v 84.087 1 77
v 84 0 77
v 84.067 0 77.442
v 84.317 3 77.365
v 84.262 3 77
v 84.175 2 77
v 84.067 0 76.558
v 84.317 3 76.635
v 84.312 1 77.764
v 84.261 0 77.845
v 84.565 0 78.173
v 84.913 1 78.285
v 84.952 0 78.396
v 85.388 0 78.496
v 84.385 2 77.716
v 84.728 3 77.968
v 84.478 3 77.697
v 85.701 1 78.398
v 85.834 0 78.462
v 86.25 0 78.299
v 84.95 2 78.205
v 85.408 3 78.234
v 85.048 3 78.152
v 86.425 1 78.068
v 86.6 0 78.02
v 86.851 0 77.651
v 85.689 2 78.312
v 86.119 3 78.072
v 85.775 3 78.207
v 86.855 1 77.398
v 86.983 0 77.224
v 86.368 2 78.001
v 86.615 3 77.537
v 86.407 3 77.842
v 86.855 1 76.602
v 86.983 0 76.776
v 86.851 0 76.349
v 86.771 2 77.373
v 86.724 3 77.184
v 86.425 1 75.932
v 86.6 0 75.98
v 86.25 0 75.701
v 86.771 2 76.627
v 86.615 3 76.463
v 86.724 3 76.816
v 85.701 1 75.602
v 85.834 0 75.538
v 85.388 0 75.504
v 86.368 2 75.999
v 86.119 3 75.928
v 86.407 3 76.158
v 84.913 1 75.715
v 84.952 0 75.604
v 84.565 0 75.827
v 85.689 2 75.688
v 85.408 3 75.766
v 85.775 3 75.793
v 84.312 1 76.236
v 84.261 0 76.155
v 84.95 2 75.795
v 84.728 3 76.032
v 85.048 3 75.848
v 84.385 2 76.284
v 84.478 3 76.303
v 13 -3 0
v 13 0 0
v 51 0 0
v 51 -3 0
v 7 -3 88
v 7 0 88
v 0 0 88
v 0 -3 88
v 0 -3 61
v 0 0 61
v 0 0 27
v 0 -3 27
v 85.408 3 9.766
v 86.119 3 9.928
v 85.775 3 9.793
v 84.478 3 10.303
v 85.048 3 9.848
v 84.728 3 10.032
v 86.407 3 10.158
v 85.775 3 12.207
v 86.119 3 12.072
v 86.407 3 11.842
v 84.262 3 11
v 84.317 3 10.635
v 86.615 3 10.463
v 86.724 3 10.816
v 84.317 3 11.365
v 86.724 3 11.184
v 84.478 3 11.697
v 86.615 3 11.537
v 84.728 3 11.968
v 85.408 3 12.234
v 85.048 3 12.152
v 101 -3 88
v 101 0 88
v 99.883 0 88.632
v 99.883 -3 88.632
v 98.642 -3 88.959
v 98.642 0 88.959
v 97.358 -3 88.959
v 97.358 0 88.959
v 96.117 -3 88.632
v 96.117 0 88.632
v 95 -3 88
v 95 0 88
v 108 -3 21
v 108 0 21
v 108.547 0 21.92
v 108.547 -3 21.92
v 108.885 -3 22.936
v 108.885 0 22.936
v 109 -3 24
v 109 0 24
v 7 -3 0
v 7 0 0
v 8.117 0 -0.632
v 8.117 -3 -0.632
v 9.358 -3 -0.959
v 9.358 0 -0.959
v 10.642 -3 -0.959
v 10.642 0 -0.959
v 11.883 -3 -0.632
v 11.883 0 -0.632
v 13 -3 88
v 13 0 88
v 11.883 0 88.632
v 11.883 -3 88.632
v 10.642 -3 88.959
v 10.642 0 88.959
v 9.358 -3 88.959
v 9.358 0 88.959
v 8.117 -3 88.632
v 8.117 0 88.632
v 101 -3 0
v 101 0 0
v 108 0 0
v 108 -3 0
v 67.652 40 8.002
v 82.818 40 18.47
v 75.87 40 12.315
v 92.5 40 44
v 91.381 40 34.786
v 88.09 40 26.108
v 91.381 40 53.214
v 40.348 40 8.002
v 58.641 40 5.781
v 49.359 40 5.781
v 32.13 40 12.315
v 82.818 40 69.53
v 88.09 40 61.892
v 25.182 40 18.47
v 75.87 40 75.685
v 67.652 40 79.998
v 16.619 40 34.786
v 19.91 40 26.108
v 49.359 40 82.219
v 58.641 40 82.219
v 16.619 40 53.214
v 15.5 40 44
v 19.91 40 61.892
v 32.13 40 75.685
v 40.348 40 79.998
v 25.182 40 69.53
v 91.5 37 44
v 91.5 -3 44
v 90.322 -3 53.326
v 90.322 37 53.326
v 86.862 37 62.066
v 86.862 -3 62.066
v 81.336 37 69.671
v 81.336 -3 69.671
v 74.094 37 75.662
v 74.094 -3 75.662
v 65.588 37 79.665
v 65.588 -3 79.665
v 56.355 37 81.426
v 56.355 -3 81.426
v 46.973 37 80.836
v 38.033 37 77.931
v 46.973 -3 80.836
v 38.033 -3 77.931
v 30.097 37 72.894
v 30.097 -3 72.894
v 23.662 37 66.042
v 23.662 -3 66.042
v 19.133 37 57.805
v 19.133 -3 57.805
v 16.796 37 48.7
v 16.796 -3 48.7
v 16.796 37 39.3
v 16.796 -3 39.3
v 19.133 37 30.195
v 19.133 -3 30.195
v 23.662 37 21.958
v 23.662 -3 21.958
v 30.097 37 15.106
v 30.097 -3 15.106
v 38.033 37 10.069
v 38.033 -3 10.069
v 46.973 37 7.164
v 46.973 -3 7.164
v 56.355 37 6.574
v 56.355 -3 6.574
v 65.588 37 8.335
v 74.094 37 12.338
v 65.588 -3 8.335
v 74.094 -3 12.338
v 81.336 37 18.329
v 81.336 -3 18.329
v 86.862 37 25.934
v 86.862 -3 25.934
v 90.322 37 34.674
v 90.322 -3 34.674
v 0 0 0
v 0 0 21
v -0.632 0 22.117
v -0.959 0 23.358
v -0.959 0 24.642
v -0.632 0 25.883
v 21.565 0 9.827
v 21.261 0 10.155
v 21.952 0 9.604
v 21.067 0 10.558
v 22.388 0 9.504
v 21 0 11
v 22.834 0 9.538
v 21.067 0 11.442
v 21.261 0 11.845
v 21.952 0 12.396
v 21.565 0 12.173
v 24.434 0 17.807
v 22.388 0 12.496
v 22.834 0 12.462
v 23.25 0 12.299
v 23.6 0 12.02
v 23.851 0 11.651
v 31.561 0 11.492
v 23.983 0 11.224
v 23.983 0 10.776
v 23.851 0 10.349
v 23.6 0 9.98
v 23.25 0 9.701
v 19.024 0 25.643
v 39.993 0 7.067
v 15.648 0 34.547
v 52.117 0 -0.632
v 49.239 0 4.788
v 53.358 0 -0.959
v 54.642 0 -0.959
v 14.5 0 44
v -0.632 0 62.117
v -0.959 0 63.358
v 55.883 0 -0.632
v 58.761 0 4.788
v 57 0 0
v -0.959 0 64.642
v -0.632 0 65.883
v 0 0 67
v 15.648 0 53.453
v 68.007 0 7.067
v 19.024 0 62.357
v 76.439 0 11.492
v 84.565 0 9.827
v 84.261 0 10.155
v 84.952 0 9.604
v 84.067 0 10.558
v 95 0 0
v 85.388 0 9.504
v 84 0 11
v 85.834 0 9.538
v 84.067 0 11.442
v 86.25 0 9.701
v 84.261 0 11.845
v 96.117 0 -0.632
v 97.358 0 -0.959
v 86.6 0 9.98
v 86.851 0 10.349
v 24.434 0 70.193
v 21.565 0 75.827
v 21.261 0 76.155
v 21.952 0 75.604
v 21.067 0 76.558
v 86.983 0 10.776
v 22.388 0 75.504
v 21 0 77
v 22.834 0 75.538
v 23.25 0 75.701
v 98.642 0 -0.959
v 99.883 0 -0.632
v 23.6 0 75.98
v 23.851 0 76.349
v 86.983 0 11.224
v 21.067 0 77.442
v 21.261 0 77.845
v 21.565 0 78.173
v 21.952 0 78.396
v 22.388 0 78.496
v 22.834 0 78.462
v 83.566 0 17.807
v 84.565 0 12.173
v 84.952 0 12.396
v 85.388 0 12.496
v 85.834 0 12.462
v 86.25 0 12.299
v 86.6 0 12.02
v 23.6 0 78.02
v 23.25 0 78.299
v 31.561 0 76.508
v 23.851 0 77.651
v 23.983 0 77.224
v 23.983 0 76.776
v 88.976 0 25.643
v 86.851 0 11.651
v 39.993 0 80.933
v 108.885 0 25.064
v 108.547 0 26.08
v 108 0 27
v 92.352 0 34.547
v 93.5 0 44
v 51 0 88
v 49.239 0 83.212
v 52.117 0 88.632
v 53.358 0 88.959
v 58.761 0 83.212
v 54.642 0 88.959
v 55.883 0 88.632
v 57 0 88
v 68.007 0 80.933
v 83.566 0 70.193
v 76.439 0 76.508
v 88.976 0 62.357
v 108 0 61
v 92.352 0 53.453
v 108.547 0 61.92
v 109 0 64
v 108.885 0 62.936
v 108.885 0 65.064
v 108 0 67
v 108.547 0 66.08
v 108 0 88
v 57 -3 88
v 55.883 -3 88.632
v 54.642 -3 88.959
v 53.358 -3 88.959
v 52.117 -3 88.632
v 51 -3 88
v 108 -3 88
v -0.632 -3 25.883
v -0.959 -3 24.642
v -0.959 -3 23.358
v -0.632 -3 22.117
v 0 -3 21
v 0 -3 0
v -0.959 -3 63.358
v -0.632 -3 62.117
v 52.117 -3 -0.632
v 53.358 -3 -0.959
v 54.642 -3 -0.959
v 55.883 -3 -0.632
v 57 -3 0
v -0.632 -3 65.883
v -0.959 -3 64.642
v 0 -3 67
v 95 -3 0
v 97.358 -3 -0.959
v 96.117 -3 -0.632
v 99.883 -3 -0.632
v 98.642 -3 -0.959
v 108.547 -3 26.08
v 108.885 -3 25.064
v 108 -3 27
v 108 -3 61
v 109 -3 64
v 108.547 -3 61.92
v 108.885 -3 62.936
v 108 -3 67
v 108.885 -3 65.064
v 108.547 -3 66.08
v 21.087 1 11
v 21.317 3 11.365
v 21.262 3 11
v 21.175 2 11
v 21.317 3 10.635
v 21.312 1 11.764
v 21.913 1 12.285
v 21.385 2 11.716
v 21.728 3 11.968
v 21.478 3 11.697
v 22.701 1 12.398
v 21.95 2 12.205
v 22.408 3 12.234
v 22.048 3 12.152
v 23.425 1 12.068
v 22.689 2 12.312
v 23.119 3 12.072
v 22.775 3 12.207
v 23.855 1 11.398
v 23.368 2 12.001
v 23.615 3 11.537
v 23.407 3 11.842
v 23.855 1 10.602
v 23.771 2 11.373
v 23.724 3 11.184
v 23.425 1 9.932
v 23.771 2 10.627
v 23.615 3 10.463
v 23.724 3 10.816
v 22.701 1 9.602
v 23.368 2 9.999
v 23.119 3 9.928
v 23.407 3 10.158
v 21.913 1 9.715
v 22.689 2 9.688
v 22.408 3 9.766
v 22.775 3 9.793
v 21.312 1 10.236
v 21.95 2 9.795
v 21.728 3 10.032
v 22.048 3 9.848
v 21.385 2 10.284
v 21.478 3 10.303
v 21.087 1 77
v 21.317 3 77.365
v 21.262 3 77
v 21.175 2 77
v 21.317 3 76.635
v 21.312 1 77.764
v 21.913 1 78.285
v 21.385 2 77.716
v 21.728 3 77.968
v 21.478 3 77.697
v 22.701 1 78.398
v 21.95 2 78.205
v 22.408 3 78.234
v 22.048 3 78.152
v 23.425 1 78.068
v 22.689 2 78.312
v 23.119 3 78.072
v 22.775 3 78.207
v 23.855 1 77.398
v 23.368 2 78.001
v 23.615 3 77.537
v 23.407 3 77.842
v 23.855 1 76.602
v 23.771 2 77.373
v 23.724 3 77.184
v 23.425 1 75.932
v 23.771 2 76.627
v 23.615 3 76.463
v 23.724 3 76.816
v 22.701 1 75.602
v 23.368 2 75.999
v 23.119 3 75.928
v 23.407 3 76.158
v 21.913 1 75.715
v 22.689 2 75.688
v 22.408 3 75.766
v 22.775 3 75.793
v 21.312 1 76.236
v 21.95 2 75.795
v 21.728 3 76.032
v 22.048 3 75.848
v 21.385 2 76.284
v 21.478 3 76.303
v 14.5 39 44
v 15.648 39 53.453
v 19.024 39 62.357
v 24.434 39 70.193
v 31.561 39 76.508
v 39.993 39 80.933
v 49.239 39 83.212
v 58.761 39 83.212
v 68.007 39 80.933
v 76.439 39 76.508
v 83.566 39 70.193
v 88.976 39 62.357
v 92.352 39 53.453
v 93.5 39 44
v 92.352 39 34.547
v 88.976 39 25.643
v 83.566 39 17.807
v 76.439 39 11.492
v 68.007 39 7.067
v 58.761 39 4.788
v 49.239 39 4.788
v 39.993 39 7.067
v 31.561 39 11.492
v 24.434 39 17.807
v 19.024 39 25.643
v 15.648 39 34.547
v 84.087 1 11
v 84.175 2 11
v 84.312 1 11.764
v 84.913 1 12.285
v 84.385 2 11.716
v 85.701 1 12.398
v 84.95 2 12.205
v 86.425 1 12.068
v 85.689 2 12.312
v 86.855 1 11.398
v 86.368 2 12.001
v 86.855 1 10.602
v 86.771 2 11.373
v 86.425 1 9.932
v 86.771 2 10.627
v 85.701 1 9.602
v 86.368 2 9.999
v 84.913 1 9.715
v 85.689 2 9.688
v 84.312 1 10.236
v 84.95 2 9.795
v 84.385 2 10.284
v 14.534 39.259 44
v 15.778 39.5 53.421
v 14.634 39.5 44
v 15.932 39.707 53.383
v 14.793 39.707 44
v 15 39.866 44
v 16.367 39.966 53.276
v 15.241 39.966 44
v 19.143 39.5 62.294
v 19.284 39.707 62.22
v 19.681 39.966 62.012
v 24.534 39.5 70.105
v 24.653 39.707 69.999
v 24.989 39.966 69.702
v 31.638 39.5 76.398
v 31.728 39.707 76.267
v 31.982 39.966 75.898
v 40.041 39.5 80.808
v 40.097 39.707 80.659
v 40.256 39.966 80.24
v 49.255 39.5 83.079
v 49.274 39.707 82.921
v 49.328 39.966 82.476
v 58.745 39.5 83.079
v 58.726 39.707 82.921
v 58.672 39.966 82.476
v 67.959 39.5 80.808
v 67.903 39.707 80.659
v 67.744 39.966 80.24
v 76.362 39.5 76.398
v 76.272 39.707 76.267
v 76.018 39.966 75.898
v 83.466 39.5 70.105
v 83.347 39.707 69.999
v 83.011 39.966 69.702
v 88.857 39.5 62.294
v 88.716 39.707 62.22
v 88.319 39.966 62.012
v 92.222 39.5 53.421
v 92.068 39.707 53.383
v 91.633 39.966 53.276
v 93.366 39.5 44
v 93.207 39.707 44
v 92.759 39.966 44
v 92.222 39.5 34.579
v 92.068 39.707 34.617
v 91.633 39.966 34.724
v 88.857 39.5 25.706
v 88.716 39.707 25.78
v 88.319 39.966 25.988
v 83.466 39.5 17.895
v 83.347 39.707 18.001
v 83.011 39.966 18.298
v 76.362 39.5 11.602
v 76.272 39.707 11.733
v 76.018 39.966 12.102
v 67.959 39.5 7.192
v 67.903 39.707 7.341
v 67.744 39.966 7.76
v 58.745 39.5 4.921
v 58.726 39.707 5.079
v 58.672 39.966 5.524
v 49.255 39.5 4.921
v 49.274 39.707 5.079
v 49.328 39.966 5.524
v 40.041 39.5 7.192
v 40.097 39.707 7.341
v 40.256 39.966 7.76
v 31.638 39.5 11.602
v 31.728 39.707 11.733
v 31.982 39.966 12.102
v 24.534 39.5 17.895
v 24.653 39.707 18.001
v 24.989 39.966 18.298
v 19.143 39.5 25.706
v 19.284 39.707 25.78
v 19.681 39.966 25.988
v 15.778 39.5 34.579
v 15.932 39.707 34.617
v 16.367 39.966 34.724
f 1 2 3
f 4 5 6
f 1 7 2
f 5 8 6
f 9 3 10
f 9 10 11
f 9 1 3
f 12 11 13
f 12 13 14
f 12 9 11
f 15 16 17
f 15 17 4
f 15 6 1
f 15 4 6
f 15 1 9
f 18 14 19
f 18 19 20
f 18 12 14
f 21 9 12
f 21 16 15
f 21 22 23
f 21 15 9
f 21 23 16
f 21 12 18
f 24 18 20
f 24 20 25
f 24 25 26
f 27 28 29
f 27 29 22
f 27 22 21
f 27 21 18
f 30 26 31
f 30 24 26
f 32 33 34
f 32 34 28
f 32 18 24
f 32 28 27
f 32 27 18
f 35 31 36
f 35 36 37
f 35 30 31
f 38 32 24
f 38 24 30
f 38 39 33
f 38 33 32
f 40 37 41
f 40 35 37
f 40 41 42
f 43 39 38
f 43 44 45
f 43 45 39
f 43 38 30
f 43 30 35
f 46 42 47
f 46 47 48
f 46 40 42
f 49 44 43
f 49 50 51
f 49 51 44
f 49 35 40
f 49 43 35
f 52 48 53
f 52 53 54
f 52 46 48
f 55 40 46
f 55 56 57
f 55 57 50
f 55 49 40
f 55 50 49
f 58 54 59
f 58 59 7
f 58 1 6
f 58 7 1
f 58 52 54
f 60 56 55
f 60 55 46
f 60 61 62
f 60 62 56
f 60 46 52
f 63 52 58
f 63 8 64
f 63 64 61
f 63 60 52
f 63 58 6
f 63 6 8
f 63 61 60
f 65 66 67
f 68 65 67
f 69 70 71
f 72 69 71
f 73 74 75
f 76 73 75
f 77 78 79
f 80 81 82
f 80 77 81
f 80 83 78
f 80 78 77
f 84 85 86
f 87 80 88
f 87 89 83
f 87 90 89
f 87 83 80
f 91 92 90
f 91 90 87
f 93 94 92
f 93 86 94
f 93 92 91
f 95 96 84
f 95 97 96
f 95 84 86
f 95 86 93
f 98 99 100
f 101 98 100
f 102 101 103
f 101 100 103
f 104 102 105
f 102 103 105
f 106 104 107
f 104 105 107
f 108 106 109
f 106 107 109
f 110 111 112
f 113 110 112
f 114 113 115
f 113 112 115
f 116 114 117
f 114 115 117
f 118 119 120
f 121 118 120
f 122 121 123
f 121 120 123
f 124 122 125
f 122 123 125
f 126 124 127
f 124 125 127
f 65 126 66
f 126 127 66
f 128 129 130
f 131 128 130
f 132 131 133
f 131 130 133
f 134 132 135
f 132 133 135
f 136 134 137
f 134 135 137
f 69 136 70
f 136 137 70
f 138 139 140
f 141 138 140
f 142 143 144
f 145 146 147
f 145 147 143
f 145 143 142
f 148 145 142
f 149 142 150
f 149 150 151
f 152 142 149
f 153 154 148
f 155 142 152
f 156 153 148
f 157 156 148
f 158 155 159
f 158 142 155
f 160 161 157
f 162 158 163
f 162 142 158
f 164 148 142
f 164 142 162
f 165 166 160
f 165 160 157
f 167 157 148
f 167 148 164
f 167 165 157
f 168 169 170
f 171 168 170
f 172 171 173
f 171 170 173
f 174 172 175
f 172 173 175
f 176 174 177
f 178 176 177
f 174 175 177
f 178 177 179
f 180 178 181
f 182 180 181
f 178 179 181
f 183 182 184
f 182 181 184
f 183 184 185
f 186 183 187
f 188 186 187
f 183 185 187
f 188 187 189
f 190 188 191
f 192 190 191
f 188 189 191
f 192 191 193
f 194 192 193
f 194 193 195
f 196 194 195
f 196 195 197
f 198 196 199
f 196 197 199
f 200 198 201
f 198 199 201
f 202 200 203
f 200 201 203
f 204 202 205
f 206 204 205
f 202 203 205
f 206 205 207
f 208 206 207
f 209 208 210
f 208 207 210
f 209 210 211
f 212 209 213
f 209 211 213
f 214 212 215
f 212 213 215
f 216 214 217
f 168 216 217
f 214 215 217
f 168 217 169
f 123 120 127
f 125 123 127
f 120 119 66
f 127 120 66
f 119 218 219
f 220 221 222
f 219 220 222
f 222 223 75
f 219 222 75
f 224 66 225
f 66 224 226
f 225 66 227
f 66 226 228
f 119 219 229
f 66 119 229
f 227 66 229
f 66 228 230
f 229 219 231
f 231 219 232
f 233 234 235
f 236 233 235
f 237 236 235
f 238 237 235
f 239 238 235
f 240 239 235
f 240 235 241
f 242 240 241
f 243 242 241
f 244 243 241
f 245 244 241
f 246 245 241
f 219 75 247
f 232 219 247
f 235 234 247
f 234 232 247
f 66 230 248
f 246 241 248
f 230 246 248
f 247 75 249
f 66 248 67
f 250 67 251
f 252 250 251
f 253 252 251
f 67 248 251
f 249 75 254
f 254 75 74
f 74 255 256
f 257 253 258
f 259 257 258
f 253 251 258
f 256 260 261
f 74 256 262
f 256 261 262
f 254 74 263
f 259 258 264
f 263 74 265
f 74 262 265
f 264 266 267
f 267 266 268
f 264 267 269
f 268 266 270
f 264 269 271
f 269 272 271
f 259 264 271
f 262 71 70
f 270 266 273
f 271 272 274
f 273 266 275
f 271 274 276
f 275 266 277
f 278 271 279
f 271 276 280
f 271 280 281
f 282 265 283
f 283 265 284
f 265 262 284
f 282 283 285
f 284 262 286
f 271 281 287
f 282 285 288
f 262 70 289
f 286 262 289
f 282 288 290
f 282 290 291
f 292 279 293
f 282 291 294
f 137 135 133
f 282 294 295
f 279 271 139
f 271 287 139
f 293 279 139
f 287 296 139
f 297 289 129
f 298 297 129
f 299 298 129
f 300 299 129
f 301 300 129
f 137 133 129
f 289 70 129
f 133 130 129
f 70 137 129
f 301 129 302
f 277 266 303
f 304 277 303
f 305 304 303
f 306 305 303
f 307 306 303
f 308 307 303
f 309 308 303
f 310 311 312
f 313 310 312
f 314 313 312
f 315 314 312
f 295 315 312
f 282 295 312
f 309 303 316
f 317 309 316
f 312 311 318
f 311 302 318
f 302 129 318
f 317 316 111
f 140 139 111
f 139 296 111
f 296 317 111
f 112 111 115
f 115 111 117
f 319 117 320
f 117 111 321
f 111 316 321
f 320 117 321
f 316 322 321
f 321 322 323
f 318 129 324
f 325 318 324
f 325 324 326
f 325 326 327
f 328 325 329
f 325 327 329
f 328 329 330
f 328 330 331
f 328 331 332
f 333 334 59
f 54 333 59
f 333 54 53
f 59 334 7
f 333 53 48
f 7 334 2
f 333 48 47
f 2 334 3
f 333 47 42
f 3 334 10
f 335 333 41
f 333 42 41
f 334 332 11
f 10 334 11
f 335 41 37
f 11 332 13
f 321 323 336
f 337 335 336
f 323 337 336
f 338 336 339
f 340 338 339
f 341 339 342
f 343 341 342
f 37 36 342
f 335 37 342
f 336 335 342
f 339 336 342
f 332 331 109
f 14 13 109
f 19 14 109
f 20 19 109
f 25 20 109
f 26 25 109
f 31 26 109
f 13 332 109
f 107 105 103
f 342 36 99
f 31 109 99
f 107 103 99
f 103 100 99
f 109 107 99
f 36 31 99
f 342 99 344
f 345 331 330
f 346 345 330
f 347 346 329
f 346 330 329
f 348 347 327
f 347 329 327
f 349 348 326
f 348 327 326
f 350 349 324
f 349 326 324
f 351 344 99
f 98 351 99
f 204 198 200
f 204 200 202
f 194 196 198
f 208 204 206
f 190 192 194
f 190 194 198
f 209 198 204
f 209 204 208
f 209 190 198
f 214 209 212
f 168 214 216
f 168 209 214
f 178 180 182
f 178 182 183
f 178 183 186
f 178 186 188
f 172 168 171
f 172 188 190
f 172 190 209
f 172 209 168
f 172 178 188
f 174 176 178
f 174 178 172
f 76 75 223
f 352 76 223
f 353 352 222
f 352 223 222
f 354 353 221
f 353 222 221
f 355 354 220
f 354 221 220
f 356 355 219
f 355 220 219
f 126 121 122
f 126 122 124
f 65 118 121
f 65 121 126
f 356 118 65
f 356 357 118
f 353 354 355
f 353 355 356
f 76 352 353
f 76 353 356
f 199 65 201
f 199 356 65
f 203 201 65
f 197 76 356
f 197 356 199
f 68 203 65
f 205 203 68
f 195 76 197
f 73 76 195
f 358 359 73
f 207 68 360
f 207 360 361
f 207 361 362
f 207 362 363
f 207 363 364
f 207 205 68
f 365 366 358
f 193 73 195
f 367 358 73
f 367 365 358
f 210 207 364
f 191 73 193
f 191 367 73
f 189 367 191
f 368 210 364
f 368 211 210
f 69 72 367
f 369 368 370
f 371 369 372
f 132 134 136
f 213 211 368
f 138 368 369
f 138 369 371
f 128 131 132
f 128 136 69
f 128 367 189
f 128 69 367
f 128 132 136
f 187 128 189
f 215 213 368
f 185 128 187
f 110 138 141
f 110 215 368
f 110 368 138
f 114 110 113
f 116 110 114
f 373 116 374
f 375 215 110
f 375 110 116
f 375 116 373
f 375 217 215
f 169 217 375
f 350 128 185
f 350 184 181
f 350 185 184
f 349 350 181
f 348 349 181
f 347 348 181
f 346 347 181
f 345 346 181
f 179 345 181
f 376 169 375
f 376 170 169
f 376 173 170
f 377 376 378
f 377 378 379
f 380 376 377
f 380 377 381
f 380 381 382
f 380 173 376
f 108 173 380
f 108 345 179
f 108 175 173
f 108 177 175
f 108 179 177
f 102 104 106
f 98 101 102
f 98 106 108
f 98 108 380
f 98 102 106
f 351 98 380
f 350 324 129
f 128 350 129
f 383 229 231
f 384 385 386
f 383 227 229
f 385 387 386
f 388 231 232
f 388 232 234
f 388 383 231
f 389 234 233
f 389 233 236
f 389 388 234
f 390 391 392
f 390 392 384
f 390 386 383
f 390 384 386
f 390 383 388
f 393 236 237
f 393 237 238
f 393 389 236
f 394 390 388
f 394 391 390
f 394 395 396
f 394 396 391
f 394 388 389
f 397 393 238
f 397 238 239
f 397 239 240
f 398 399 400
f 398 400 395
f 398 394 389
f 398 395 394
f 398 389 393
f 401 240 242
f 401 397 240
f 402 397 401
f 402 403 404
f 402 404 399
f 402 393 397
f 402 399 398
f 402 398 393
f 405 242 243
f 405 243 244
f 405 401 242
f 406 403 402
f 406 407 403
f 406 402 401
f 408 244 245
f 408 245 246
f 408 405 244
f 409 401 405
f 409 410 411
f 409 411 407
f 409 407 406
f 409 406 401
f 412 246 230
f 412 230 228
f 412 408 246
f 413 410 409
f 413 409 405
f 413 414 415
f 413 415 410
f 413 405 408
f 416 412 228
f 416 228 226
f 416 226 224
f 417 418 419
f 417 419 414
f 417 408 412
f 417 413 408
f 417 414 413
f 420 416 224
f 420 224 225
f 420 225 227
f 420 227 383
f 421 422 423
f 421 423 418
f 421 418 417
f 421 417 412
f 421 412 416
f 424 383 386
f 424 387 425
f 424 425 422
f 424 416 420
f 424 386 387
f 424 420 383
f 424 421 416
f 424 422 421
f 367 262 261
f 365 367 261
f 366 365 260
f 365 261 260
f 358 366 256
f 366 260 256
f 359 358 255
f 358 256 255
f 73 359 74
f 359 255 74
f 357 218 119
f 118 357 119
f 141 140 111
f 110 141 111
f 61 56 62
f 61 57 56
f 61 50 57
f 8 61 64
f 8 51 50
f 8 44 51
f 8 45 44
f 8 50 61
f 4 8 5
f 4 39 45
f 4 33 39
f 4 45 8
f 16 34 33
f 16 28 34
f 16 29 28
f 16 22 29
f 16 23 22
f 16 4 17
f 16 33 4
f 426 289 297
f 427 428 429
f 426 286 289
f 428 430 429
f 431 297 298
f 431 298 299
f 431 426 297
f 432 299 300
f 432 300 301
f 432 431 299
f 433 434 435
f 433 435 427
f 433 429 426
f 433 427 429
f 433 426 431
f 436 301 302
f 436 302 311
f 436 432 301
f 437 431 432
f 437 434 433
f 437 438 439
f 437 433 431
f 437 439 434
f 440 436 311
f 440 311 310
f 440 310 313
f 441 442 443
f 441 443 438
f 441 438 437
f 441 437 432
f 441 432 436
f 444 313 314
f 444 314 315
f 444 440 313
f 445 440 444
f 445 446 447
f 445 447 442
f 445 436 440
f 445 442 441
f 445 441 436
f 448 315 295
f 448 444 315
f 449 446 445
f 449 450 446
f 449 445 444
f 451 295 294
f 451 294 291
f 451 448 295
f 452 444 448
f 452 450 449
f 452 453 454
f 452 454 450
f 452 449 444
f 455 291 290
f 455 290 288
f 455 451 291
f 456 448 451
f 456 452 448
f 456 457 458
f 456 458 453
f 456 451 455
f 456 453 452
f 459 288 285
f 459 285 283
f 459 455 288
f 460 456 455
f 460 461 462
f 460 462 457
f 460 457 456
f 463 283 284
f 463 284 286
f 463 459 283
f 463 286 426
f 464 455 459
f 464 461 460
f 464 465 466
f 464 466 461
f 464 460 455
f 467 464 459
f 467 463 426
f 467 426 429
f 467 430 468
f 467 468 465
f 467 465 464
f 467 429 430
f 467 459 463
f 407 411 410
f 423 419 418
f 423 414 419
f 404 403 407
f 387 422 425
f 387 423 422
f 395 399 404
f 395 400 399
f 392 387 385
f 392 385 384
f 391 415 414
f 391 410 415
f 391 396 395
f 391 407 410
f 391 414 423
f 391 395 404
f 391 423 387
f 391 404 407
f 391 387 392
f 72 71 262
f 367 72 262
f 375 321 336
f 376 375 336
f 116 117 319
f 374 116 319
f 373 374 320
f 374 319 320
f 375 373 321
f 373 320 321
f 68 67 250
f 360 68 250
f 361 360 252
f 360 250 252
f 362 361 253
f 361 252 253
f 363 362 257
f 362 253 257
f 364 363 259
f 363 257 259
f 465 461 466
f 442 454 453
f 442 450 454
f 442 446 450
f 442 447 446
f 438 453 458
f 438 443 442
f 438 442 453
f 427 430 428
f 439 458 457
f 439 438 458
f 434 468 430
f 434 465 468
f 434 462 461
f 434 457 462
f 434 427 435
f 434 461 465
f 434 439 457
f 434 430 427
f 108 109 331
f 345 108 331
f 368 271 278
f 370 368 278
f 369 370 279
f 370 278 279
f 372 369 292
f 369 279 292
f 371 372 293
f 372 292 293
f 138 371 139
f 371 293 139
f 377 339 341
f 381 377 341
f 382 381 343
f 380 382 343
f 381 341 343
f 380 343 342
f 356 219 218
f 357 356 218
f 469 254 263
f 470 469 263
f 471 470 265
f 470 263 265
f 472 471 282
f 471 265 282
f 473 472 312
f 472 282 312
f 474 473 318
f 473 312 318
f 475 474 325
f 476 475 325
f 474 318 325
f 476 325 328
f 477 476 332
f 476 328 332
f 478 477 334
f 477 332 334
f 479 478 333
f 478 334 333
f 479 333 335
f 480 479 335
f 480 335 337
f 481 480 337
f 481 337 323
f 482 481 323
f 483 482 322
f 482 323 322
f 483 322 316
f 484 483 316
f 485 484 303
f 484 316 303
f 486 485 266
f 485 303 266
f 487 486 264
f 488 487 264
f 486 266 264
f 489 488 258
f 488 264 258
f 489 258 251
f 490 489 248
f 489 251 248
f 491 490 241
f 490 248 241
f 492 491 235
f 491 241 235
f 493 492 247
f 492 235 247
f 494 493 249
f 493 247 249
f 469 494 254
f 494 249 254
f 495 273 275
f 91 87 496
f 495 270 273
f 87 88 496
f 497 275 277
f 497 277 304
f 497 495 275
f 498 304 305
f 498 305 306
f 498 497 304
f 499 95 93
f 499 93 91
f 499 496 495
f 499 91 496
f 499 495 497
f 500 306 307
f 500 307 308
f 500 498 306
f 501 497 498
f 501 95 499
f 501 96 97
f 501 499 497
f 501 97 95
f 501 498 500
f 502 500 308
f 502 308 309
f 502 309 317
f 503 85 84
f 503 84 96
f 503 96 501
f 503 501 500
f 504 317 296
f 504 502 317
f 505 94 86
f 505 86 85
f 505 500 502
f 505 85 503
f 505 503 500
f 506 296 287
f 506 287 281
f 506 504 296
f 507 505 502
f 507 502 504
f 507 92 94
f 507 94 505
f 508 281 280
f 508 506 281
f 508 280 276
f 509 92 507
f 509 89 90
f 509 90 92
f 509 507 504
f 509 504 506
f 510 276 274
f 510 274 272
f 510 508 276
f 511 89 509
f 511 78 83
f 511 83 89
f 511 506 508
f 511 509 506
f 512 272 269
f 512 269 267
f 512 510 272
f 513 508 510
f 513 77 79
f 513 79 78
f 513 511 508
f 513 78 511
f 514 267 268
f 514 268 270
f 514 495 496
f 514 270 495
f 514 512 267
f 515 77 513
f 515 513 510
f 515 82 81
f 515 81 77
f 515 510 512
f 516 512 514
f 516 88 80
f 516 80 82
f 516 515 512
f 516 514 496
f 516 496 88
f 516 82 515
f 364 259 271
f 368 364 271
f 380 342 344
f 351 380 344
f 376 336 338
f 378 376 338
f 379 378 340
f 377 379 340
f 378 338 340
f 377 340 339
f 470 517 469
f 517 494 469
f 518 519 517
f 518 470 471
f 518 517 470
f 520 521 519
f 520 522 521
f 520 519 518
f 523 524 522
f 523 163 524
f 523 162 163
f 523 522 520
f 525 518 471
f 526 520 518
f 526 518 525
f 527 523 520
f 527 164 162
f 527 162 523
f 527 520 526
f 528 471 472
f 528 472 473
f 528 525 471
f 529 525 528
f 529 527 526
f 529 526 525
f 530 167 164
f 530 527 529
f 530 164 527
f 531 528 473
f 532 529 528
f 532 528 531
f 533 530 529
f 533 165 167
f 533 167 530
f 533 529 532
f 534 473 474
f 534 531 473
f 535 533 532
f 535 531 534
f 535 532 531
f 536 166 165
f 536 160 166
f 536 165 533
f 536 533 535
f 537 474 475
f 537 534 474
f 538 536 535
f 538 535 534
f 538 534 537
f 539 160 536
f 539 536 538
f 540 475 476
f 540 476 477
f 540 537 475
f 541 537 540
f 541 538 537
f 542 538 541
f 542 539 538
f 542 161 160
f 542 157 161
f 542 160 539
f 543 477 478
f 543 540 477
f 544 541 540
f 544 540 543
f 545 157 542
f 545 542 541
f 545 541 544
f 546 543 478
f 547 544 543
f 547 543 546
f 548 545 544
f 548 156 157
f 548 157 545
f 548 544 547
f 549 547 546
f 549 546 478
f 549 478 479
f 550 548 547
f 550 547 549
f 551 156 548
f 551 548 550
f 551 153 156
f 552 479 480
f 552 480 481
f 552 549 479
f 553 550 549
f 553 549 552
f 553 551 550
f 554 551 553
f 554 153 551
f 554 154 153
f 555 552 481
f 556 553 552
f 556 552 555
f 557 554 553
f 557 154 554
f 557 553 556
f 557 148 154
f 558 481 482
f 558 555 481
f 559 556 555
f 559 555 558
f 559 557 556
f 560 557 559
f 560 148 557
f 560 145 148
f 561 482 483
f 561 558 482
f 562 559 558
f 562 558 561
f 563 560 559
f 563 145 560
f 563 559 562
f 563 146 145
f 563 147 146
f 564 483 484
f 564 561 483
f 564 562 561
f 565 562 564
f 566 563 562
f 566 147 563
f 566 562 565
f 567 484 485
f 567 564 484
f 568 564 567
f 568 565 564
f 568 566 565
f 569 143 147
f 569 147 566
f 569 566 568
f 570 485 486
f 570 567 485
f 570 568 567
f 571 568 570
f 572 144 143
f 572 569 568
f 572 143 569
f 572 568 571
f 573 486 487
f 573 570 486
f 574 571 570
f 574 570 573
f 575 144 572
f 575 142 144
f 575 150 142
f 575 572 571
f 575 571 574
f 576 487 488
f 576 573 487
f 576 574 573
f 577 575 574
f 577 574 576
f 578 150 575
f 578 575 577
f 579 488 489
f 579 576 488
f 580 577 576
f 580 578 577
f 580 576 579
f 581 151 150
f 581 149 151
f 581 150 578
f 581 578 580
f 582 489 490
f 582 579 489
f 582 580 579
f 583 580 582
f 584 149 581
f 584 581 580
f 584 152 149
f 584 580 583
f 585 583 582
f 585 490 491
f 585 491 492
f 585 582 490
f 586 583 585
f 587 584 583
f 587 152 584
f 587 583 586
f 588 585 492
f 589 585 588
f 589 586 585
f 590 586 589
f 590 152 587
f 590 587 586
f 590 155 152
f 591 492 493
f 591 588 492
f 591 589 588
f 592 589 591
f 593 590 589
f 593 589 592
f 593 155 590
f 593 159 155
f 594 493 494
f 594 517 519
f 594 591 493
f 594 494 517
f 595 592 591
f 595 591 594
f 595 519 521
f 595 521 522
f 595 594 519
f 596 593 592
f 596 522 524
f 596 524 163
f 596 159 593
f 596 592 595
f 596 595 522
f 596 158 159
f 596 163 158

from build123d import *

# Parameters (mm, degrees)
F1_DEPTH = 3
F2_R     = 39.5
F3_DEPTH = 40
F4_R     = 1.5
F5_DEPTH = 3
F5_TAPER = 5
F6_R     = 1
F7_R     = 37.5
F8_DEPTH = 40


with BuildPart() as f1:
    # F0 (on Front) → F1 (new body)
    with BuildSketch(Plane.XZ):
        with BuildLine():
            Line((0, 21), (0, 0))
            Line((0, 0), (7, 0))
            ThreePointArc((7, 0), (7.7639320225, 8.472135955), (15, 4))
            ThreePointArc((15, 4), (14.472135955, 1.7639320225), (13, 0))
            Line((13, 0), (51, 0))
            ThreePointArc((51, 0), (49.2565835097, 5.5811388301), (54, 9))
            Line((54, 9), (54, 44))
            Line((54, 44), (0, 44))
            Line((0, 44), (0, 27))
            ThreePointArc((0, 27), (5.5811388301, 28.7434164903), (9, 24))
            ThreePointArc((9, 24), (5.5811388301, 19.2565835097), (0, 21))
        make_face()
        with BuildLine():
            ThreePointArc((15, 4), (7.7639320225, 8.472135955), (7, 0))
            Line((7, 0), (13, 0))
            ThreePointArc((13, 0), (14.472135955, 1.7639320225), (15, 4))
        make_face()
        with BuildLine():
            Line((13, 0), (7, 0))
            ThreePointArc((7, 0), (10, -1), (13, 0))
        make_face()
        with BuildLine():
            ThreePointArc((0, 27), (-1, 24), (0, 21))
            Line((0, 21), (0, 27))
        make_face()
        with BuildLine():
            Line((0, 27), (0, 21))
            ThreePointArc((0, 21), (5.5811388301, 19.2565835097), (9, 24))
            ThreePointArc((9, 24), (5.5811388301, 28.7434164903), (0, 27))
        make_face()
        with BuildLine():
            ThreePointArc((54, 9), (49.2565835097, 5.5811388301), (51, 0))
            Line((51, 0), (54, 0))
            Line((54, 0), (54, 9))
        make_face()
        with BuildLine():
            Line((54, 0), (51, 0))
            ThreePointArc((51, 0), (54, -1), (57, 0))
            Line((57, 0), (54, 0))
        make_face()
        with BuildLine():
            Line((0, 61), (0, 44))
            Line((0, 44), (54, 44))
            Line((54, 44), (54, 79))
            ThreePointArc((54, 79), (49.2565835097, 82.4188611699), (51, 88))
            Line((51, 88), (13, 88))
            ThreePointArc((13, 88), (14.472135955, 86.2360679775), (15, 84))
            ThreePointArc((15, 84), (7.7639320225, 79.527864045), (7, 88))
            Line((7, 88), (0, 88))
            Line((0, 88), (0, 67))
            ThreePointArc((0, 67), (5.5811388301, 68.7434164903), (9, 64))
            ThreePointArc((9, 64), (5.5811388301, 59.2565835097), (0, 61))
        make_face()
        with BuildLine():
            Line((54, 9), (54, 0))
            Line((54, 0), (57, 0))
            ThreePointArc((57, 0), (58.472135955, 1.7639320225), (59, 4))
            ThreePointArc((59, 4), (57.5355339059, 7.5355339059), (54, 9))
        make_face()
        with BuildLine():
            Line((54, 44), (54, 9))
            ThreePointArc((54, 9), (57.5355339059, 7.5355339059), (59, 4))
            ThreePointArc((59, 4), (58.472135955, 1.7639320225), (57, 0))
            Line((57, 0), (95, 0))
            ThreePointArc((95, 0), (95.7639320225, 8.472135955), (103, 4))
            ThreePointArc((103, 4), (102.472135955, 1.7639320225), (101, 0))
            Line((101, 0), (108, 0))
            Line((108, 0), (108, 21))
            ThreePointArc((108, 21), (99, 24), (108, 27))
            Line((108, 27), (108, 44))
            Line((108, 44), (54, 44))
        make_face()
        with BuildLine():
            ThreePointArc((0, 67), (-1, 64), (0, 61))
            Line((0, 61), (0, 67))
        make_face()
        with BuildLine():
            Line((0, 67), (0, 61))
            ThreePointArc((0, 61), (5.5811388301, 59.2565835097), (9, 64))
            ThreePointArc((9, 64), (5.5811388301, 68.7434164903), (0, 67))
        make_face()
        with BuildLine():
            Line((54, 79), (54, 44))
            Line((54, 44), (108, 44))
            Line((108, 44), (108, 61))
            ThreePointArc((108, 61), (99, 64), (108, 67))
            Line((108, 67), (108, 88))
            Line((108, 88), (101, 88))
            ThreePointArc((101, 88), (102.472135955, 86.2360679775), (103, 84))
            ThreePointArc((103, 84), (95.7639320225, 79.527864045), (95, 88))
            Line((95, 88), (57, 88))
            ThreePointArc((57, 88), (58.472135955, 86.2360679775), (59, 84))
            ThreePointArc((59, 84), (57.5355339059, 80.4644660941), (54, 79))
        make_face()
        with BuildLine():
            ThreePointArc((103, 4), (95.7639320225, 8.472135955), (95, 0))
            Line((95, 0), (101, 0))
            ThreePointArc((101, 0), (102.472135955, 1.7639320225), (103, 4))
        make_face()
        with BuildLine():
            Line((101, 0), (95, 0))
            ThreePointArc((95, 0), (98, -1), (101, 0))
        make_face()
        with BuildLine():
            ThreePointArc((51, 88), (49.2565835097, 82.4188611699), (54, 79))
            Line((54, 79), (54, 88))
            Line((54, 88), (51, 88))
        make_face()
        with BuildLine():
            Line((54, 88), (54, 79))
            ThreePointArc((54, 79), (57.5355339059, 80.4644660941), (59, 84))
            ThreePointArc((59, 84), (58.472135955, 86.2360679775), (57, 88))
            Line((57, 88), (54, 88))
        make_face()
        with BuildLine():
            Line((51, 88), (54, 88))
            Line((54, 88), (57, 88))
            ThreePointArc((57, 88), (54, 89), (51, 88))
        make_face()
        with BuildLine():
            ThreePointArc((109, 24), (108.7434164903, 25.5811388301), (108, 27))
            Line((108, 27), (108, 21))
            ThreePointArc((108, 21), (108.7434164903, 22.4188611699), (109, 24))
        make_face()
        with BuildLine():
            Line((108, 21), (108, 27))
            ThreePointArc((108, 27), (99, 24), (108, 21))
        make_face()
        with BuildLine():
            ThreePointArc((108, 67), (99, 64), (108, 61))
            Line((108, 61), (108, 67))
        make_face()
        with BuildLine():
            Line((108, 67), (108, 61))
            ThreePointArc((108, 61), (108.7434164903, 62.4188611699), (109, 64))
            ThreePointArc((109, 64), (108.7434164903, 65.5811388301), (108, 67))
        make_face()
        with BuildLine():
            ThreePointArc((13, 88), (10, 89), (7, 88))
            Line((7, 88), (13, 88))
        make_face()
        with BuildLine():
            Line((13, 88), (7, 88))
            ThreePointArc((7, 88), (7.7639320225, 79.527864045), (15, 84))
            ThreePointArc((15, 84), (14.472135955, 86.2360679775), (13, 88))
        make_face()
        with BuildLine():
            ThreePointArc((101, 88), (98, 89), (95, 88))
            Line((95, 88), (101, 88))
        make_face()
        with BuildLine():
            Line((101, 88), (95, 88))
            ThreePointArc((95, 88), (95.7639320225, 79.527864045), (103, 84))
            ThreePointArc((103, 84), (102.472135955, 86.2360679775), (101, 88))
        make_face()
    extrude(amount=F1_DEPTH)

    # F2 (on face) → F3 (join)
    with BuildSketch(Plane(origin=(0, 0, 0), x_dir=(-1, 0, 0), z_dir=(0, 1, 0))):
        with Locations((-54, 44)):
            Circle(F2_R)
    extrude(amount=F3_DEPTH)

    # F4 (on face) → F5 (join)
    with BuildSketch(Plane(origin=(0, 0, 0), x_dir=(-1, 0, 0), z_dir=(0, 1, 0))):
        with Locations((-85.5000000012, 77)):
            Circle(F4_R)
        with Locations((-22.4999999988, 77)):
            Circle(F4_R)
        with Locations((-85.5000000012, 11)):
            Circle(F4_R)
        with Locations((-22.4999999988, 11)):
            Circle(F4_R)
    extrude(amount=F5_DEPTH, taper=F5_TAPER)

    # F6
    f6_edges = [f1.edges().sort_by_distance(p)[0] for p in [
        (93.5, 40, 44),
    ]]
    fillet(f6_edges, radius=F6_R)

    # F7 (on face) → F8 (cut)
    with BuildSketch(Plane.XZ.offset(3)):
        with Locations((54, 44)):
            Circle(F7_R)
    extrude(amount=-F8_DEPTH, mode=Mode.SUBTRACT)


solid = f1.part
